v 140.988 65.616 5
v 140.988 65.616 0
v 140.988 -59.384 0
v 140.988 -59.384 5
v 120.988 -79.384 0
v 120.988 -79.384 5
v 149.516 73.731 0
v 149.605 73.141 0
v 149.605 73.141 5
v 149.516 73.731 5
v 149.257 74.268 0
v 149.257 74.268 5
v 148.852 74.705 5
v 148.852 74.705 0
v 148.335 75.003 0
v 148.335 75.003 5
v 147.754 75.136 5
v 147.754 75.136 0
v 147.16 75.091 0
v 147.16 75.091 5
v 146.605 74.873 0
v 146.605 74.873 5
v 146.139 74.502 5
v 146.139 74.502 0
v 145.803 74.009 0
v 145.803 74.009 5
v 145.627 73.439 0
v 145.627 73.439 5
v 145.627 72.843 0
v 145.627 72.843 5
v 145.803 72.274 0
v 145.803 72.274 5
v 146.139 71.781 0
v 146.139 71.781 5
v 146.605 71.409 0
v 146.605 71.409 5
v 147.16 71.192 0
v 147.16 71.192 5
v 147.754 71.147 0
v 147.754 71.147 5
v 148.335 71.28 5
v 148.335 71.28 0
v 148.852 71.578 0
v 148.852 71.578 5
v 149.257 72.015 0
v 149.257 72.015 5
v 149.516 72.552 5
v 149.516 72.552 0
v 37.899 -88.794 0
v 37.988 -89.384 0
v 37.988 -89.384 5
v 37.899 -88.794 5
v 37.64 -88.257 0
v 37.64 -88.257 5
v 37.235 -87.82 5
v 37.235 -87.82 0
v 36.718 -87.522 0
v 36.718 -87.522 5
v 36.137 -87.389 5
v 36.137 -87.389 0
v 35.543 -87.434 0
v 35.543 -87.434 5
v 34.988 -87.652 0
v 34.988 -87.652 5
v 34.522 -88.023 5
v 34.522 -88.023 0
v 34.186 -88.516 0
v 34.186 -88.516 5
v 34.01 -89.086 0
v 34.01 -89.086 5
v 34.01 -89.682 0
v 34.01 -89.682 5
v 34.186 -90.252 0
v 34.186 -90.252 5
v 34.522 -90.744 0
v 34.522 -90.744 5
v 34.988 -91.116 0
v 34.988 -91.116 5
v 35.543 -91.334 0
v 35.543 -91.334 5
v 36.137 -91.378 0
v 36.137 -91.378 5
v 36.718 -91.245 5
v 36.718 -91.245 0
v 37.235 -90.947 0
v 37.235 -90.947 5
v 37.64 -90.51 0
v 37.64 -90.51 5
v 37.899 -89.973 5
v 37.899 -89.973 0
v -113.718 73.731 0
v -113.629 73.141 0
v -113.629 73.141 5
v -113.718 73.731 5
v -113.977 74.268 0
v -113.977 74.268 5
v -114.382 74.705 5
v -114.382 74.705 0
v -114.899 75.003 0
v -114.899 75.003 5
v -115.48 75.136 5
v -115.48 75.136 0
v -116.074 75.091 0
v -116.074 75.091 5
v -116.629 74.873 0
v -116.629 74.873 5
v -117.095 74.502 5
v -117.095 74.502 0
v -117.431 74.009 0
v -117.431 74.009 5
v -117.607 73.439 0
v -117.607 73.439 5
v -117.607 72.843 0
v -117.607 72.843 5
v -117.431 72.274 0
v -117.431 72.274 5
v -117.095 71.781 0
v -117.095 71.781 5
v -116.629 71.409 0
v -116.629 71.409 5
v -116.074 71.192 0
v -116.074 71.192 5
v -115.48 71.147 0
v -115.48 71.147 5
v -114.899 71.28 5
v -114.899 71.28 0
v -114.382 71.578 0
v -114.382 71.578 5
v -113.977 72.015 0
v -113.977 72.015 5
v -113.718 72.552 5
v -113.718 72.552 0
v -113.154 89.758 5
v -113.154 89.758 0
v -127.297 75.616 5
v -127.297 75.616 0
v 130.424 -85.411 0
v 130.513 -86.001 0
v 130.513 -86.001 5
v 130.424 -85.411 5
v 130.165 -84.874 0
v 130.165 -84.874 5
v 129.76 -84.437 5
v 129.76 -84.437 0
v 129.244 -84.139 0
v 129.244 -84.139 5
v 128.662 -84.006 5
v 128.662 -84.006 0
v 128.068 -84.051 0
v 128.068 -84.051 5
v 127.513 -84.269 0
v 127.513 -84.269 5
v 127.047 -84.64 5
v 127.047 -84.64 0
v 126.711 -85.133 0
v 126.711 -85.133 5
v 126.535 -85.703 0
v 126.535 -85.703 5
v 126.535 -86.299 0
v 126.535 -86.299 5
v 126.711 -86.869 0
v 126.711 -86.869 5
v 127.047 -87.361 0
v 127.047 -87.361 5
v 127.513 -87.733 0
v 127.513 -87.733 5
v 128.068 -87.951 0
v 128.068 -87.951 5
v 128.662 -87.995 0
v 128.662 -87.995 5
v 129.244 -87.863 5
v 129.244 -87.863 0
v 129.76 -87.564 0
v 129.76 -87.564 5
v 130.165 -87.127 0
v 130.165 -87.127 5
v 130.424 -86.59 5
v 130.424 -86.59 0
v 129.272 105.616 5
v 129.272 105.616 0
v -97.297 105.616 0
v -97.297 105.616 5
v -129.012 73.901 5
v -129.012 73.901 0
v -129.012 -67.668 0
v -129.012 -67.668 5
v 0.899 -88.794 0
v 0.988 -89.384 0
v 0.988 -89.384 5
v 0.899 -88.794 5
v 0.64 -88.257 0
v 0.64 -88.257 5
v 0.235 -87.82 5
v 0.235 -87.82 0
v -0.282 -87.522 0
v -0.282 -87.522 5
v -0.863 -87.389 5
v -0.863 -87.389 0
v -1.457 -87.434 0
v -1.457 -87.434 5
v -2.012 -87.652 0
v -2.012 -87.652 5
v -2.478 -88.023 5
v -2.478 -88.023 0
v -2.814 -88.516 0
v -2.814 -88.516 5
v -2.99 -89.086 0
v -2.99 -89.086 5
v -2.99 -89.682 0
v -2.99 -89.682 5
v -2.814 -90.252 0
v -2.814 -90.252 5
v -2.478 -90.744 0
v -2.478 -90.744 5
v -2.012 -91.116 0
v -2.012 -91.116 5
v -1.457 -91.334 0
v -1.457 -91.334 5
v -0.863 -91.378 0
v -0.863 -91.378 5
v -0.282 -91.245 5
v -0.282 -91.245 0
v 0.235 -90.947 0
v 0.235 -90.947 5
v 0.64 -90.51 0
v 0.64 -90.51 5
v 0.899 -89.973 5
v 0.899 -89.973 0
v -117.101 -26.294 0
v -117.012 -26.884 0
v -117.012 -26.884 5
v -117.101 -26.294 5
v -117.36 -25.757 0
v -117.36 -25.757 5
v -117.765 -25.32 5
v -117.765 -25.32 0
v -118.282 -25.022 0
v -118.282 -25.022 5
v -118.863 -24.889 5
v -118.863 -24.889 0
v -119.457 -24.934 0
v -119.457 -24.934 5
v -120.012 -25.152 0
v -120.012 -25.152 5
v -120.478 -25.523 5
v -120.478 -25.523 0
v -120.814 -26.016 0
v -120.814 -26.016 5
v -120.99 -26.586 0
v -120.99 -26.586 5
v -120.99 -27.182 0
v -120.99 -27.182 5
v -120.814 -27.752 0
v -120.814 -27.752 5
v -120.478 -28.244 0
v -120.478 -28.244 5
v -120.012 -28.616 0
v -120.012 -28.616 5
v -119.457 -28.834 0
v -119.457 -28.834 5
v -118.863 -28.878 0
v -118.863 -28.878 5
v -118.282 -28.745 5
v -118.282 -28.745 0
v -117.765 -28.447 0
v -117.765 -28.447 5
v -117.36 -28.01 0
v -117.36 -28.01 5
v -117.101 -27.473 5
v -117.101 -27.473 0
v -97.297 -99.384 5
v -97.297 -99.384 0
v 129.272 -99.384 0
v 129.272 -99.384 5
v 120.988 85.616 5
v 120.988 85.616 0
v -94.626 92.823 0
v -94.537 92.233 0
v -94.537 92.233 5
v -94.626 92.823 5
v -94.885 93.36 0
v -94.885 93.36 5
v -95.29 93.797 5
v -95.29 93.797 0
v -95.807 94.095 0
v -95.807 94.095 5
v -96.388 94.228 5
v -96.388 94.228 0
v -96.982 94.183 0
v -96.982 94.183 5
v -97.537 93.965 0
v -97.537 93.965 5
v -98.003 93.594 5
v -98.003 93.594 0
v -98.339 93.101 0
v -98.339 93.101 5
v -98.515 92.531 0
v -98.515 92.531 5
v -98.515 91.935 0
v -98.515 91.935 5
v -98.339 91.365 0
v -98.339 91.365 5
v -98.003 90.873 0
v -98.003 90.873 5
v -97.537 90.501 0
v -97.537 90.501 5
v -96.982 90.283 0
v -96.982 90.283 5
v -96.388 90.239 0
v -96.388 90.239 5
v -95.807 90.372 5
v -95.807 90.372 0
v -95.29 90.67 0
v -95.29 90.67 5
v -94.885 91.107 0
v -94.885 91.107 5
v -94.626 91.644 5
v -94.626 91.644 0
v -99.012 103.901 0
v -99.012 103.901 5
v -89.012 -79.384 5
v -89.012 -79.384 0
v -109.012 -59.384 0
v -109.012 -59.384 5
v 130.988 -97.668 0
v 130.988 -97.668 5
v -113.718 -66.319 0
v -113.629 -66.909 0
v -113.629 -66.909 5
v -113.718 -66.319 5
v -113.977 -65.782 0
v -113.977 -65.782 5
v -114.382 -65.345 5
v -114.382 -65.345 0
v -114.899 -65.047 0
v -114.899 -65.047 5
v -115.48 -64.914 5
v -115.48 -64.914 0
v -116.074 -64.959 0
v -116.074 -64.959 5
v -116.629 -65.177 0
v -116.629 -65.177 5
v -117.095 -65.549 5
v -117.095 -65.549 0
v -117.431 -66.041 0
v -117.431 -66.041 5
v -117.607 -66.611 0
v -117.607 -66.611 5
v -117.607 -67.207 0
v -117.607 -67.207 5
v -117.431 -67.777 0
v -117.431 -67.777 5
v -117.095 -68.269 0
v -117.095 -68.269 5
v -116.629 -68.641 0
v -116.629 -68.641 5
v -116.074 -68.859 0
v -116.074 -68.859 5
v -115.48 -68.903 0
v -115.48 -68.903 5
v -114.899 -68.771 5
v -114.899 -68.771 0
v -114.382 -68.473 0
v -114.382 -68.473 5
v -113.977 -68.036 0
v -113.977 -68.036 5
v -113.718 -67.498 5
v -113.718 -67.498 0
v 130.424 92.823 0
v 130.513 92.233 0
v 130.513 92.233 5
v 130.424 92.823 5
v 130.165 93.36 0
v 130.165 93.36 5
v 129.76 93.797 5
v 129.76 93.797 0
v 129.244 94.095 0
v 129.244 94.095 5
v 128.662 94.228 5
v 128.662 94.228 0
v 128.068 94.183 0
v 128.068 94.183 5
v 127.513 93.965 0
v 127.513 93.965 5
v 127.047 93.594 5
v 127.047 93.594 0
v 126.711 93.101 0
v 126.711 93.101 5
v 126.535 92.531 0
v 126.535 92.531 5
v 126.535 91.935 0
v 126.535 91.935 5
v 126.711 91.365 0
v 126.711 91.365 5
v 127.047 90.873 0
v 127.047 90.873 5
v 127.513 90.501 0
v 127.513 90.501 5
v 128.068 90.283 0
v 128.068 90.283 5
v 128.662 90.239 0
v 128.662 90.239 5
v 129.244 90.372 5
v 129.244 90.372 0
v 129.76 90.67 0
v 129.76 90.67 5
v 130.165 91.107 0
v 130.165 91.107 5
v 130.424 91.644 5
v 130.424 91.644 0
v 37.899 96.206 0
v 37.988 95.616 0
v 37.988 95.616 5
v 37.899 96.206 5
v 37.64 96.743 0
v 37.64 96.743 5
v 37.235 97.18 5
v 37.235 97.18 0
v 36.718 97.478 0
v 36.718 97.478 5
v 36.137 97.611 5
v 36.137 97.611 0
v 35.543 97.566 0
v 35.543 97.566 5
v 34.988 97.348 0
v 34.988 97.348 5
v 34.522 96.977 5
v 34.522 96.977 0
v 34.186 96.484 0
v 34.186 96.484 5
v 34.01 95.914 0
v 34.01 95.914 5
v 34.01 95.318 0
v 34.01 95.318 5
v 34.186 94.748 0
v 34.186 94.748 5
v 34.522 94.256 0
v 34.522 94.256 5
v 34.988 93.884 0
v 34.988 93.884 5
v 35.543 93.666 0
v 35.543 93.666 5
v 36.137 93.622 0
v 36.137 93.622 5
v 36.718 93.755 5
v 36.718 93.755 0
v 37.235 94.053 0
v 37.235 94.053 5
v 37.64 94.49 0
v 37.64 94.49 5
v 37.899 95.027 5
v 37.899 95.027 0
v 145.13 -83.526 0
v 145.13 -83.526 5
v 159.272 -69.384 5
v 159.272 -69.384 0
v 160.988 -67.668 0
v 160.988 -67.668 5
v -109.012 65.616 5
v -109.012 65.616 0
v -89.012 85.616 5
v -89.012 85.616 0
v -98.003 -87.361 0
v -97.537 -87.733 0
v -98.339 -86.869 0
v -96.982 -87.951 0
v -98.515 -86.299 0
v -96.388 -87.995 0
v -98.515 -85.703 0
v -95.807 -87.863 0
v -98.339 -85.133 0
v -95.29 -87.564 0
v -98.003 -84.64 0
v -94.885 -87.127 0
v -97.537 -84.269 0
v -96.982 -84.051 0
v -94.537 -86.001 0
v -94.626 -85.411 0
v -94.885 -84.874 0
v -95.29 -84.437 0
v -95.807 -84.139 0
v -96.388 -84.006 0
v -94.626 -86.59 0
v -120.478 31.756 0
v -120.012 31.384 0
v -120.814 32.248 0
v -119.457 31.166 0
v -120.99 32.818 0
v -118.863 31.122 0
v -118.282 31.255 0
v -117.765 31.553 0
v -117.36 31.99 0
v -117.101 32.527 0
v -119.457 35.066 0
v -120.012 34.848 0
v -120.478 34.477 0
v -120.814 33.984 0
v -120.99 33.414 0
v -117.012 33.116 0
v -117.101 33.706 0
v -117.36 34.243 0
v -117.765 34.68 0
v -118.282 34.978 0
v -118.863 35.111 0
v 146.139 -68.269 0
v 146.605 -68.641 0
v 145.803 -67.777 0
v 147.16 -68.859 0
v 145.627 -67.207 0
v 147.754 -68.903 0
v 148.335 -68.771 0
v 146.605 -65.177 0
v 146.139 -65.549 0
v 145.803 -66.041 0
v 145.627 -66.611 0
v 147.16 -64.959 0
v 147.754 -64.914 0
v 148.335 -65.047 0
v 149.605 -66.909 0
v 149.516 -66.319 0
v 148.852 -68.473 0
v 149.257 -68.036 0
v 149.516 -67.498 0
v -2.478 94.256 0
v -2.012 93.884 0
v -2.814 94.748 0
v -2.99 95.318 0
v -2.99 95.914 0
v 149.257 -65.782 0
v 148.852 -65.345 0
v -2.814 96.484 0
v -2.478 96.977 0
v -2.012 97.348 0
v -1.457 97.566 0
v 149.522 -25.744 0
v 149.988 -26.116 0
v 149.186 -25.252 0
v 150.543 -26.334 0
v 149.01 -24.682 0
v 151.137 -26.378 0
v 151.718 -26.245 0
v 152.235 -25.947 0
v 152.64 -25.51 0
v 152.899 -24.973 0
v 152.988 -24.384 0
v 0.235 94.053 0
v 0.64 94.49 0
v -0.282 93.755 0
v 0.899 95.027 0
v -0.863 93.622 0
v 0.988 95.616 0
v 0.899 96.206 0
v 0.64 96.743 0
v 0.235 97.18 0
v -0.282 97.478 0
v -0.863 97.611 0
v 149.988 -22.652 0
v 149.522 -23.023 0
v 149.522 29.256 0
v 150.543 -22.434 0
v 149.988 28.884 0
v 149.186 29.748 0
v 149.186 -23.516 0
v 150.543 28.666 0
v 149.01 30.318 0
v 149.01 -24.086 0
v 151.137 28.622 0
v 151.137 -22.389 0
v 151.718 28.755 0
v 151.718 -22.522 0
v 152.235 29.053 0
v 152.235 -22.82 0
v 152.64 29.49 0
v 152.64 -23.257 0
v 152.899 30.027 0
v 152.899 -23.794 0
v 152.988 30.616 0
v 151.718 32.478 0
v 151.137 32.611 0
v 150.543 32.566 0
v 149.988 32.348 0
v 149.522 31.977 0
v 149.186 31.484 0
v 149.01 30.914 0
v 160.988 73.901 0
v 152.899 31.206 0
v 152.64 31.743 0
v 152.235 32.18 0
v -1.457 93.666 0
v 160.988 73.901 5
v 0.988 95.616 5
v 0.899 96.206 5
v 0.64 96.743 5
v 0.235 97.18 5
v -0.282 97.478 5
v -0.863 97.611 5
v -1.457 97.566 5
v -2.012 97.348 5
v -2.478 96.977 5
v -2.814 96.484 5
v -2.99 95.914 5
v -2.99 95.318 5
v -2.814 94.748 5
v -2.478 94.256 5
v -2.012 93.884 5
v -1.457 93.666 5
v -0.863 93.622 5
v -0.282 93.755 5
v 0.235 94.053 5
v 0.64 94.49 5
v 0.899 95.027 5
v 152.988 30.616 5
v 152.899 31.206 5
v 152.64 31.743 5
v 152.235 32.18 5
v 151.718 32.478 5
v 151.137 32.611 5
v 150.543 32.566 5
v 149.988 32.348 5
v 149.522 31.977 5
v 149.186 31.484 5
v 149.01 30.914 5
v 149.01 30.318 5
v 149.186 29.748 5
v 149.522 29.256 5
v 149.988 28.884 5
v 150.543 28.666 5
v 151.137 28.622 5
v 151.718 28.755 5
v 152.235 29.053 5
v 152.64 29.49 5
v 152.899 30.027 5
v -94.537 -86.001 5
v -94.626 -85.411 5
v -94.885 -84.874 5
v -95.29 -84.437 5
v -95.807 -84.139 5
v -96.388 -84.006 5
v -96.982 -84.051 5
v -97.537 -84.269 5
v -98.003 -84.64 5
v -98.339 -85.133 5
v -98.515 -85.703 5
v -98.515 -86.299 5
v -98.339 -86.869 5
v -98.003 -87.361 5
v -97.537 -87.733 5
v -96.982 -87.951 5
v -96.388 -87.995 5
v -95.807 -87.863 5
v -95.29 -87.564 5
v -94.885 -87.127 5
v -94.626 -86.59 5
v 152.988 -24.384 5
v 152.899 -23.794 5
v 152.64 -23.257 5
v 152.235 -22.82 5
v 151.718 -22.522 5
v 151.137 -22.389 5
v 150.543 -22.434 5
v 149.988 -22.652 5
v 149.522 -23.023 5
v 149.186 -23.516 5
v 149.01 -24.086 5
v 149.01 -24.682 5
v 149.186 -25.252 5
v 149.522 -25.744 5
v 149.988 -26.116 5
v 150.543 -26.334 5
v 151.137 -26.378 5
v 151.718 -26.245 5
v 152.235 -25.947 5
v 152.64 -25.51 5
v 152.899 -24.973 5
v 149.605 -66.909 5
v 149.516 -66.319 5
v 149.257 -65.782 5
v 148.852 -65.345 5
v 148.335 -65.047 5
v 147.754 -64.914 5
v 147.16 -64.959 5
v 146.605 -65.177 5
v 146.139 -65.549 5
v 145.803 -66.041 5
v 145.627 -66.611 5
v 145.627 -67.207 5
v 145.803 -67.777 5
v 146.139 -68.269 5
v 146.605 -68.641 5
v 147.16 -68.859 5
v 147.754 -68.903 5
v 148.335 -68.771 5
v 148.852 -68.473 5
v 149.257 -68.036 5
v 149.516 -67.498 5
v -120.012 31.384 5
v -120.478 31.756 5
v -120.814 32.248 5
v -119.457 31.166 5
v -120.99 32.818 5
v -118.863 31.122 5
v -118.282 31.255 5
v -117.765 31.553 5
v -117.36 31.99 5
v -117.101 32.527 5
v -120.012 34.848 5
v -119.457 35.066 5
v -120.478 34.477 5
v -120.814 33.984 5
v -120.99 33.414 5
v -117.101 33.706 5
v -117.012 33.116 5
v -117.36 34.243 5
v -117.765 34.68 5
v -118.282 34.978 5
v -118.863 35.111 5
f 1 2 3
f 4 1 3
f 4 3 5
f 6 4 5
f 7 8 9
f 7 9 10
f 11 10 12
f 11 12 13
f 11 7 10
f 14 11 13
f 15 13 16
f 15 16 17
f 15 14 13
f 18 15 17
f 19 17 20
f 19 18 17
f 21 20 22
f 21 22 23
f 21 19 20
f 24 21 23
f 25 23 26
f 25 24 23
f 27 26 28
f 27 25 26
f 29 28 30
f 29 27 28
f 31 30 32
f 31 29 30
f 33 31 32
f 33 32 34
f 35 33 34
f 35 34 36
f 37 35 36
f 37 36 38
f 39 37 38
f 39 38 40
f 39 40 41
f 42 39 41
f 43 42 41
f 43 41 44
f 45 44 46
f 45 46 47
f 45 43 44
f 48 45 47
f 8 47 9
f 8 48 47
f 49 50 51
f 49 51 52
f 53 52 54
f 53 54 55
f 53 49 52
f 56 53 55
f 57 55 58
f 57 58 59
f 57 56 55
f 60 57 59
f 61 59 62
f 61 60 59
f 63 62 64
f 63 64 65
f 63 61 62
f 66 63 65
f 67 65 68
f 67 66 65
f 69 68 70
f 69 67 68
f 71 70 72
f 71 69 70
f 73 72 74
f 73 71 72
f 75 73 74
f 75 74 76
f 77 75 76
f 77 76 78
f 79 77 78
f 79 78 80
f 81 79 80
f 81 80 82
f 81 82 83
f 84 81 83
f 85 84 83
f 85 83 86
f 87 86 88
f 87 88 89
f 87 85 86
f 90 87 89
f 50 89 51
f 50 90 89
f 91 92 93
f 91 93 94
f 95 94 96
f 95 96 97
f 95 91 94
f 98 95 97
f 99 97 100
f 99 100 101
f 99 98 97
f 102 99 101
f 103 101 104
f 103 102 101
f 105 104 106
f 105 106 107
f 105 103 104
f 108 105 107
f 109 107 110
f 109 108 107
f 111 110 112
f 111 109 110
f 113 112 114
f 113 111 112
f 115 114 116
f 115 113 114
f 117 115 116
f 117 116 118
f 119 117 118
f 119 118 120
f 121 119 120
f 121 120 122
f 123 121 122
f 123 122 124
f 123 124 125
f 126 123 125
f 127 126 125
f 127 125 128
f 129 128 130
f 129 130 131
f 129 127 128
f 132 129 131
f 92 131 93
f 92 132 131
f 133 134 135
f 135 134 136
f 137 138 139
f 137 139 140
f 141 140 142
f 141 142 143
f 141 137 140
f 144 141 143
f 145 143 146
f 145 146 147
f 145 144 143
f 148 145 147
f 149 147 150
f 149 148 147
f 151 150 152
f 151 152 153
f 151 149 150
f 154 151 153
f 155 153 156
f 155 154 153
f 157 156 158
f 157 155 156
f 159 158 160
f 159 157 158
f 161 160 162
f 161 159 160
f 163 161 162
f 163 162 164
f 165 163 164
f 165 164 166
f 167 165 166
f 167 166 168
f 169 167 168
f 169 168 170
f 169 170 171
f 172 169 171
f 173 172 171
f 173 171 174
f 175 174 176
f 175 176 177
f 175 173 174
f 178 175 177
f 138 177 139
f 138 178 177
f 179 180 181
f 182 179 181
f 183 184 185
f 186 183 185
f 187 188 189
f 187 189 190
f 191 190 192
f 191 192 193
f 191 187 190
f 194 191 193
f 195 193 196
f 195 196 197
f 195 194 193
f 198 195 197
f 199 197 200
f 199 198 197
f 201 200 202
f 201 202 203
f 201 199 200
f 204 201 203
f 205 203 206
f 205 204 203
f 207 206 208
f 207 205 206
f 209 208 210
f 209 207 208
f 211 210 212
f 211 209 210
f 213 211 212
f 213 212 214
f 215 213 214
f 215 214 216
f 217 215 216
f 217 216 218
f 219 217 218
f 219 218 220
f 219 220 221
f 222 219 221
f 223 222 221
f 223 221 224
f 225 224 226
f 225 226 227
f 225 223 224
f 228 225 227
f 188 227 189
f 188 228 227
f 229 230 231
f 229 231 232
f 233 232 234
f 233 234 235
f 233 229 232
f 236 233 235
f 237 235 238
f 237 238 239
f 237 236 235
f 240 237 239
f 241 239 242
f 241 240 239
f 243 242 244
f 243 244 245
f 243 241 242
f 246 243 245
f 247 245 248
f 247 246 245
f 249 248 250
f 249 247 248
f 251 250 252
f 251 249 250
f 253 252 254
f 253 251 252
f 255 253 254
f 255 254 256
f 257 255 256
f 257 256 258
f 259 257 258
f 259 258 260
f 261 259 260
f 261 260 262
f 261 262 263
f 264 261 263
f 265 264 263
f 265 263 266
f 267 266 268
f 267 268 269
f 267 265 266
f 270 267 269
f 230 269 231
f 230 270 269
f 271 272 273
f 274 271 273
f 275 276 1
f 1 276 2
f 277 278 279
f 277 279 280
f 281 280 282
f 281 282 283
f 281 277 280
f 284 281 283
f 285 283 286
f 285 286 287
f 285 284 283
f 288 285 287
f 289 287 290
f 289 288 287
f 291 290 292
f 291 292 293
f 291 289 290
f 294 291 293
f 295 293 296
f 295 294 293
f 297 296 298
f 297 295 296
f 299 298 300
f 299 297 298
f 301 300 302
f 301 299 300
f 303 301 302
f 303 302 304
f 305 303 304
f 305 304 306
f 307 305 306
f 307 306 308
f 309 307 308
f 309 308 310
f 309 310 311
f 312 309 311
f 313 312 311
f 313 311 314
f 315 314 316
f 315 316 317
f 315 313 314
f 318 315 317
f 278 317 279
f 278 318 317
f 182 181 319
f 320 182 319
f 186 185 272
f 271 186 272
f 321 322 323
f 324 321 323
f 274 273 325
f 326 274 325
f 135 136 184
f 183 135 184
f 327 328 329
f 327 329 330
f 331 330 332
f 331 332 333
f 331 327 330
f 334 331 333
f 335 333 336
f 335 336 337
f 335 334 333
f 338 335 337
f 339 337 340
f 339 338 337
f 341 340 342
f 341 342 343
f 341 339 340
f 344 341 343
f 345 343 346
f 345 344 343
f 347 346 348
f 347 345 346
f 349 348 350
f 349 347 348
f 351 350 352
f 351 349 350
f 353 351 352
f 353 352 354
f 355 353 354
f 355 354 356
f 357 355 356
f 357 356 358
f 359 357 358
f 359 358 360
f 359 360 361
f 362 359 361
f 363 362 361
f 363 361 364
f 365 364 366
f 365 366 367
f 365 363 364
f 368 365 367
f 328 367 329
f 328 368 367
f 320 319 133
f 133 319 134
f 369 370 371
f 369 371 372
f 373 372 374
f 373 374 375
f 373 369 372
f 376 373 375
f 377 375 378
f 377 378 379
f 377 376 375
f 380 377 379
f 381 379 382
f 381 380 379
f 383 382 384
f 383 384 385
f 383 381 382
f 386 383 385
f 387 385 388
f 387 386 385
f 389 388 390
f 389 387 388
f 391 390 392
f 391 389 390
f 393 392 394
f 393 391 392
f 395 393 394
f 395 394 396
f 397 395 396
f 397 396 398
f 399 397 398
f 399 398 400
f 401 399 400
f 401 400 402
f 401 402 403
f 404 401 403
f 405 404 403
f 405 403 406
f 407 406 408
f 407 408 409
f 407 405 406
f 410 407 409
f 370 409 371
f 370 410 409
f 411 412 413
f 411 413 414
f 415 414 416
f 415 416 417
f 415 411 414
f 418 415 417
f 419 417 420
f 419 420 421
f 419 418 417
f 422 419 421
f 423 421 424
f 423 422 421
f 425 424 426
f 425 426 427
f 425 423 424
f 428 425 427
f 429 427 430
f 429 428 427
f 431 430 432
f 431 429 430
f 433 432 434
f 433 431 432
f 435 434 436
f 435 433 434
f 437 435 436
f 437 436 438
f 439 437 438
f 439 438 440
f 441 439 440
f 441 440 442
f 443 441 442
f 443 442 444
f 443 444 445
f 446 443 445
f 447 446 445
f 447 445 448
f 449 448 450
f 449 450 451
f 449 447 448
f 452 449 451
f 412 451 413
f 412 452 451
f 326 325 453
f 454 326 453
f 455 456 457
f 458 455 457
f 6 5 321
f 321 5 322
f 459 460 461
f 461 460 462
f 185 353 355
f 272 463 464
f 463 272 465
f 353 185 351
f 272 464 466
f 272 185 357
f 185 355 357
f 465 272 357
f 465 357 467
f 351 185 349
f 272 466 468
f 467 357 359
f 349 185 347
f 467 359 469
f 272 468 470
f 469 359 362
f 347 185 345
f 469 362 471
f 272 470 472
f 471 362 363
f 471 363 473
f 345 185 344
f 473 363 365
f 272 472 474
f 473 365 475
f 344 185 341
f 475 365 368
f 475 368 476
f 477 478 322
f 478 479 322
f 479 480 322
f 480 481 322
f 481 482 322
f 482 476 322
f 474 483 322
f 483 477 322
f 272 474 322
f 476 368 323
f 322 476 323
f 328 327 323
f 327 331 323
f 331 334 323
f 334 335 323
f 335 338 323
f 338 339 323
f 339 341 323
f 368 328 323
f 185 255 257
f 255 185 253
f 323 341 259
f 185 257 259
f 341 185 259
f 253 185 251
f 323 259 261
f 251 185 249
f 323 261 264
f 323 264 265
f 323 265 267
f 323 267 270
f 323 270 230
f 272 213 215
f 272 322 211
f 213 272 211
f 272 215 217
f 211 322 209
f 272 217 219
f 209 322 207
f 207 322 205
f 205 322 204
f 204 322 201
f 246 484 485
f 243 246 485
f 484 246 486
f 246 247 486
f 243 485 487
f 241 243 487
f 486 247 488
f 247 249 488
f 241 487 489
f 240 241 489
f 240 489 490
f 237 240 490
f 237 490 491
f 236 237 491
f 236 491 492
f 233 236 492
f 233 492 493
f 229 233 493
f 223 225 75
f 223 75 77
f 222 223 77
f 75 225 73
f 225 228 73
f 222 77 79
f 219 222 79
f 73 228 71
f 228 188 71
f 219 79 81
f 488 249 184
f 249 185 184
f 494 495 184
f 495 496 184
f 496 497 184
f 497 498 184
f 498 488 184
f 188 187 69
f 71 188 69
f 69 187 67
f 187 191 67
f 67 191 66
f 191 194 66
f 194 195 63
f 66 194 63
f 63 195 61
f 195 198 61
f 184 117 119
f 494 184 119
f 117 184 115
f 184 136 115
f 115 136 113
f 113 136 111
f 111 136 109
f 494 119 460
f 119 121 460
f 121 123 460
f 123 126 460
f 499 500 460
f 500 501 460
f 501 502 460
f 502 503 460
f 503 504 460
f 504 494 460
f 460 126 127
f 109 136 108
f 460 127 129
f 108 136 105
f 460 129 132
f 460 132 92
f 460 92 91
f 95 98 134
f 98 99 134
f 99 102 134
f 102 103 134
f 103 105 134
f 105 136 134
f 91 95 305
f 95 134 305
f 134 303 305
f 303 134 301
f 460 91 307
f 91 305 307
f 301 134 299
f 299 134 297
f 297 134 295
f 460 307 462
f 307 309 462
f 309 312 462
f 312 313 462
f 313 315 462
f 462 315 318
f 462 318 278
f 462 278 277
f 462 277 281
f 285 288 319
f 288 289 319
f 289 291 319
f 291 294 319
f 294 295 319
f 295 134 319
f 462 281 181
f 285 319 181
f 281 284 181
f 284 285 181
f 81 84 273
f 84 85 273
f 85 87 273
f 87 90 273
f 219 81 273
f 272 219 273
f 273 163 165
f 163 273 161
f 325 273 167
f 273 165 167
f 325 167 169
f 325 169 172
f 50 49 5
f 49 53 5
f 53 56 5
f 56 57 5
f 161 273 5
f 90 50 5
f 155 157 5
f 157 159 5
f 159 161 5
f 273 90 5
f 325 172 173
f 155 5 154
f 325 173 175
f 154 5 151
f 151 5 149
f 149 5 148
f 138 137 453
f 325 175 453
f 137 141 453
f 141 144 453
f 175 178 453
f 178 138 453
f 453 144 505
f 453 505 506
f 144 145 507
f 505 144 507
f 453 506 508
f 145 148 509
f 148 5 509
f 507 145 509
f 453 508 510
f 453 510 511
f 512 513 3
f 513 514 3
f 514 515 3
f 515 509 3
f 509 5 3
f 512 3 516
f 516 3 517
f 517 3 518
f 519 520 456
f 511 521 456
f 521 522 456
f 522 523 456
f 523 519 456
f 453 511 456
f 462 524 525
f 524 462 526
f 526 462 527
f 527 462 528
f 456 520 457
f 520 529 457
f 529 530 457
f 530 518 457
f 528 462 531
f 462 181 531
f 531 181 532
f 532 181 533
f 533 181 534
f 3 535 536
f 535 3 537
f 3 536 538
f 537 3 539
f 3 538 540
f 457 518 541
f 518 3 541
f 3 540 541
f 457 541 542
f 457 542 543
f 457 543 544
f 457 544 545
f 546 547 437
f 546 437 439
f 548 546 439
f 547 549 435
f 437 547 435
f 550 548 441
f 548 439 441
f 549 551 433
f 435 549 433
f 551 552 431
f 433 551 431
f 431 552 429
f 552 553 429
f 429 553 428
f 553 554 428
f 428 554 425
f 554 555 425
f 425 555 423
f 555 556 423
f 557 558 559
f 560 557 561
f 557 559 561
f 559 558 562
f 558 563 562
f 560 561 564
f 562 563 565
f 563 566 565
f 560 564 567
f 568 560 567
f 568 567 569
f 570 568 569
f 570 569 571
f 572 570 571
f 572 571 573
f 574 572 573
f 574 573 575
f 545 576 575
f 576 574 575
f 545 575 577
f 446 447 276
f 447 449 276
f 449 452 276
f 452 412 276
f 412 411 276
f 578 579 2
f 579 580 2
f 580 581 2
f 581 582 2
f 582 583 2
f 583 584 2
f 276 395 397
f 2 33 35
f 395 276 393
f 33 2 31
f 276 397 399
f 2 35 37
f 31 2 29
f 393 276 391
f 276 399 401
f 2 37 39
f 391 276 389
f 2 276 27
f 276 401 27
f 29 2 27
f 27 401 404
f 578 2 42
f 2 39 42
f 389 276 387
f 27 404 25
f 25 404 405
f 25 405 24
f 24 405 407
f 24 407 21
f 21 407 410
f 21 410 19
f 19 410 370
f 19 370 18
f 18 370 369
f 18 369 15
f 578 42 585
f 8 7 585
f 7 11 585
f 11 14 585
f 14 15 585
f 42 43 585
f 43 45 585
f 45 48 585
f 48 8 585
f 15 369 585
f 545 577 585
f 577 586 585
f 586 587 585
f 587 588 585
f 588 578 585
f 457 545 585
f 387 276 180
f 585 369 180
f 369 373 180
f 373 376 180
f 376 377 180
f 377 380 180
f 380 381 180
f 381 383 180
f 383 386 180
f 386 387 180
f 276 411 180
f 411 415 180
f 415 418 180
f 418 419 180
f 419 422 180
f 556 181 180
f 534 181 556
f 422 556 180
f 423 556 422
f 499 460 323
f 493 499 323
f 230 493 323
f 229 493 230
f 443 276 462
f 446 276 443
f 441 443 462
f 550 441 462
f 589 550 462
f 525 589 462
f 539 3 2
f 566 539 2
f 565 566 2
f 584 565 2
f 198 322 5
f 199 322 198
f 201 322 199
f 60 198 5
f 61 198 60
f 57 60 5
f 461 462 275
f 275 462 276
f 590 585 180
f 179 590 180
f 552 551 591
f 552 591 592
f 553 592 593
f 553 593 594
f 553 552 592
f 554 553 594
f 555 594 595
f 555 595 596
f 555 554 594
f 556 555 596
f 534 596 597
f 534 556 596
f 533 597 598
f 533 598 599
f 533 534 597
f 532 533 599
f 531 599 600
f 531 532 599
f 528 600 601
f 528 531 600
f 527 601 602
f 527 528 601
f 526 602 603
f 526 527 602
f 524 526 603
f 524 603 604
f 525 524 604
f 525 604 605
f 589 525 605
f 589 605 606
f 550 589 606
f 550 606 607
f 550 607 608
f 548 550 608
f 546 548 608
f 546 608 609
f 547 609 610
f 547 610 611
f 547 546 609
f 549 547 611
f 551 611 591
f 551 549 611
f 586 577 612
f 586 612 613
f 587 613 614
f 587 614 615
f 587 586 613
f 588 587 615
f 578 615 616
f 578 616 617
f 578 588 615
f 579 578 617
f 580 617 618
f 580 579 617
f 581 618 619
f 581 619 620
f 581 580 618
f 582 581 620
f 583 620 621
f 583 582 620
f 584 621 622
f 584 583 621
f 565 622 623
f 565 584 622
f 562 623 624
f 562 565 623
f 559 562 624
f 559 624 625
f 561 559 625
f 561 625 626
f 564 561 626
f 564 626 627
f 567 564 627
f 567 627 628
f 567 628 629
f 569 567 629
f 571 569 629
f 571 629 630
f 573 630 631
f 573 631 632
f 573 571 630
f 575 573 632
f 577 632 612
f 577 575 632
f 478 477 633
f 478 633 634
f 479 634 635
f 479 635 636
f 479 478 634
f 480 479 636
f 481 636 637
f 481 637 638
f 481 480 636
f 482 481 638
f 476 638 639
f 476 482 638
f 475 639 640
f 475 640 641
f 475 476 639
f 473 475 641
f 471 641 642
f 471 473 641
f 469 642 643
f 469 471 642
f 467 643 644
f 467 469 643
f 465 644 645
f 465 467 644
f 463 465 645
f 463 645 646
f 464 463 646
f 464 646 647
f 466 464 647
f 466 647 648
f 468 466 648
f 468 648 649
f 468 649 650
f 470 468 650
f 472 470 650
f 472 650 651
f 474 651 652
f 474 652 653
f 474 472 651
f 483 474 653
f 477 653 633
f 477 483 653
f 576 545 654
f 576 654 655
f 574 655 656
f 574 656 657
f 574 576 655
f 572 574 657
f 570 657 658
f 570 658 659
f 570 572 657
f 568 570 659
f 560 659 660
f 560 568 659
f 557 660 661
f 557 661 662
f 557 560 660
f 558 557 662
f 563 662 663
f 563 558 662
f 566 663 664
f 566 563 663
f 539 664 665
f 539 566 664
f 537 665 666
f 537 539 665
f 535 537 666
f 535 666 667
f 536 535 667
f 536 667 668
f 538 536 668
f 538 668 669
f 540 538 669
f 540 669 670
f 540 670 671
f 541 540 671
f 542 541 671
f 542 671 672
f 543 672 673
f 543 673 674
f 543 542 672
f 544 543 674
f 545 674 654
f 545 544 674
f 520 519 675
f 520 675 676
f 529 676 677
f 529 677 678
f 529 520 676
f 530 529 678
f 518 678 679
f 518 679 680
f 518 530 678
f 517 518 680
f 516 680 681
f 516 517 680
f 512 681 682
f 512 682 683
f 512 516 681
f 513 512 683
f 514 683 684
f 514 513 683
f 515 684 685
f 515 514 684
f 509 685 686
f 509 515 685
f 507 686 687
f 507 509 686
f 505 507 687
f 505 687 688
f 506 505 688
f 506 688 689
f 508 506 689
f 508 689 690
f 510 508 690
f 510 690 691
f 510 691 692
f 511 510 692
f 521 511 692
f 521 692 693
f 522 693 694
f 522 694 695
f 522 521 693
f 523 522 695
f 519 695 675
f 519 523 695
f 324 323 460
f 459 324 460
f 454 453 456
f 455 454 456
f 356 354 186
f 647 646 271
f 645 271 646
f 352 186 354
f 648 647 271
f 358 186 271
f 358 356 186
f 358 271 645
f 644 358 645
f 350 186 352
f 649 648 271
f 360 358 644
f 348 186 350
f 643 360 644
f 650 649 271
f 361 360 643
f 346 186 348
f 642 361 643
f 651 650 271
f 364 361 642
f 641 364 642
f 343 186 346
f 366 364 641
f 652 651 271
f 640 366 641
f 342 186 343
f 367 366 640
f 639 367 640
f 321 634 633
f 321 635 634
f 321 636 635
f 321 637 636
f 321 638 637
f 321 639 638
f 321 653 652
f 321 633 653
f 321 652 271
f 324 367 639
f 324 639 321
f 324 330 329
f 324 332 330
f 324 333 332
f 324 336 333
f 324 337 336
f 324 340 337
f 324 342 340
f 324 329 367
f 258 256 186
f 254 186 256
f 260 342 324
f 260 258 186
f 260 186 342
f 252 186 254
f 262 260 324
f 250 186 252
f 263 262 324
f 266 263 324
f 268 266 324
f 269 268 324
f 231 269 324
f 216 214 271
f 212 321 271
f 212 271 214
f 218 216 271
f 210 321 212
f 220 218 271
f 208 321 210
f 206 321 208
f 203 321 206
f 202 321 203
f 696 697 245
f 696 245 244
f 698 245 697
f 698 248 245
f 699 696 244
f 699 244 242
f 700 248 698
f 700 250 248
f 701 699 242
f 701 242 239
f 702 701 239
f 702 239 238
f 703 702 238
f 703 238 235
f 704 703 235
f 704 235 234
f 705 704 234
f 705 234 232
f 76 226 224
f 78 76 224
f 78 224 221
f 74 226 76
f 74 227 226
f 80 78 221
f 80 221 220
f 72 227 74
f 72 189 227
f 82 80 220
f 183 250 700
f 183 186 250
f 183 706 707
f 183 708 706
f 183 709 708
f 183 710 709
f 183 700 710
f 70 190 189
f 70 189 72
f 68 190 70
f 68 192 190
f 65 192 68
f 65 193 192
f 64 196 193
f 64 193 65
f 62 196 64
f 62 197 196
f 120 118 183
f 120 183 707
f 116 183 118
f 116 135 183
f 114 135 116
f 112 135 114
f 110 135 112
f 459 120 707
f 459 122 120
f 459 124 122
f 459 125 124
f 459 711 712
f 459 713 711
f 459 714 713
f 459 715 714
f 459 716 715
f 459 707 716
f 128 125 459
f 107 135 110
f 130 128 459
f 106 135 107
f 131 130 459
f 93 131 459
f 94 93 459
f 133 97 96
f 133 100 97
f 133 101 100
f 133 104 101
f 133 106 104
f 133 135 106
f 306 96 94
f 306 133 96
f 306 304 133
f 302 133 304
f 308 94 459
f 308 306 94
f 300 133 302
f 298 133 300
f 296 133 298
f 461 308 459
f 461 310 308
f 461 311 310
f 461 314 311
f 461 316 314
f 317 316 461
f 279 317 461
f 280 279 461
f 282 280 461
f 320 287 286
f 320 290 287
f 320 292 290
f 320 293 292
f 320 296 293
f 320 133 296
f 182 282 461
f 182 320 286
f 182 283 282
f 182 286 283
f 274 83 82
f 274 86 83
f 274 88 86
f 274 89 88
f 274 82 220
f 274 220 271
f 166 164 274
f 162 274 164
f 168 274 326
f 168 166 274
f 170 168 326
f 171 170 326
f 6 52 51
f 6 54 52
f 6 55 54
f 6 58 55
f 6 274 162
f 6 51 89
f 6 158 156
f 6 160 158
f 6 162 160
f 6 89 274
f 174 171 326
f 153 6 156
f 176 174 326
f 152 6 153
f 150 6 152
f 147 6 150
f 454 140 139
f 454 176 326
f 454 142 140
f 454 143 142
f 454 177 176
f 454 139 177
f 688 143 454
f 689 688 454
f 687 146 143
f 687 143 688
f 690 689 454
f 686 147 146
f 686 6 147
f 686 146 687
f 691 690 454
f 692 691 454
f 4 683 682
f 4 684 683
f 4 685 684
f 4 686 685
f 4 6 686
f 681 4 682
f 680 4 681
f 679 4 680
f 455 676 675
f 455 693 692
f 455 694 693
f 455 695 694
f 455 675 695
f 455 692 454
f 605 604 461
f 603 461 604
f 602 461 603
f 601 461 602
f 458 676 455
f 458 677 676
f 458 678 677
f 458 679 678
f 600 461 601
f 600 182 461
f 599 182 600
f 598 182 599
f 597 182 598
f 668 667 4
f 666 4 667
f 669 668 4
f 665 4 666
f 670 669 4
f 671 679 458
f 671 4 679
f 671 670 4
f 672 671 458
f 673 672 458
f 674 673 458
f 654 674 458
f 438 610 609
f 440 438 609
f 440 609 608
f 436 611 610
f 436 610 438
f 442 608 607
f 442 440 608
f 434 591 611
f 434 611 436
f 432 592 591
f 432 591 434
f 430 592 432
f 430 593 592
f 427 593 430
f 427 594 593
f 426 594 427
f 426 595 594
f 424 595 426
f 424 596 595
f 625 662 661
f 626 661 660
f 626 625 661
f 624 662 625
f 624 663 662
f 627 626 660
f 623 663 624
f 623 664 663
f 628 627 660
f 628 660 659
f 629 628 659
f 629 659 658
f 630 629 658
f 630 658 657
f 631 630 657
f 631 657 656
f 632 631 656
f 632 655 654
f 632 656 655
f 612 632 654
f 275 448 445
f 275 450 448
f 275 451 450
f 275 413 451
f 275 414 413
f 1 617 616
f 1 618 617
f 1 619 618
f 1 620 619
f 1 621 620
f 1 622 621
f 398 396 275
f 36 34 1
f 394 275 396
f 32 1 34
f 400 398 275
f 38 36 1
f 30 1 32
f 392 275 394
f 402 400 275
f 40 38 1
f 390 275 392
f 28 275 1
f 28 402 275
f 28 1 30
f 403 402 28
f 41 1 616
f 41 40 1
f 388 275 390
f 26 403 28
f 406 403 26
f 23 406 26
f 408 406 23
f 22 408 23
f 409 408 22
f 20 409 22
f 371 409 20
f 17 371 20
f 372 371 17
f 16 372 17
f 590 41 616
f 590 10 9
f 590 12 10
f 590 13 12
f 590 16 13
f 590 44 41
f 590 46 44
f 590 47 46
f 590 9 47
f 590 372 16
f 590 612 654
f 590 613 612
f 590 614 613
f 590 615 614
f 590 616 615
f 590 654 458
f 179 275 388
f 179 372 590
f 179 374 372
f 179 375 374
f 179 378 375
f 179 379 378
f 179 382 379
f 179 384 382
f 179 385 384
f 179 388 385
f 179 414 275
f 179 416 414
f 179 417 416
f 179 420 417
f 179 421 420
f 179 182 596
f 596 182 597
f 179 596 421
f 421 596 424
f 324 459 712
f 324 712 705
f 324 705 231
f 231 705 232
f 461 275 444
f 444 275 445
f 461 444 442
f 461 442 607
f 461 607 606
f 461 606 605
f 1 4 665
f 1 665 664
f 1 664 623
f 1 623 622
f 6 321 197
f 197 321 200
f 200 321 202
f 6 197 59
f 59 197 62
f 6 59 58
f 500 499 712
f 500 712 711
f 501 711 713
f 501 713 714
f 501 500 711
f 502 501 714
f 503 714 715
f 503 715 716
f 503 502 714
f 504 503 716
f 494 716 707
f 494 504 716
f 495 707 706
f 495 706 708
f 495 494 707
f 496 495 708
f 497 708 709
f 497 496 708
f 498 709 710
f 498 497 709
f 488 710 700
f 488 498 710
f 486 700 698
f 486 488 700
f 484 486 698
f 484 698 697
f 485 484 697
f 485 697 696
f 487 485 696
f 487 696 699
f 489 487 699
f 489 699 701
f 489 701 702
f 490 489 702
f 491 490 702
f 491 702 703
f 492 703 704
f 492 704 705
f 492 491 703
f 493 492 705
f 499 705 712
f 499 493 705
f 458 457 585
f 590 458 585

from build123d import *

# Parameters (mm, degrees)
SKETCH1_W           = 20
SKETCH1_H           = 80
SKETCH1_R           = 2
SKETCH1_W_2         = 27
SKETCH1_H_2         = 20
SKETCH1_W_3         = 30
SKETCH1_H_3         = 70
SKETCH1_W_4         = 57
BOSS_EXTRUDE1_DEPTH = 5


with BuildPart() as part:
    # Sketch1 → Boss-Extrude1 (new body)
    with BuildSketch(Plane.XY):
        Polygon((-113.154404335, -55.241611667), (-109.012268711, -59.383747291), (-109.012268711, -36.883747291), (-129.012268711, -36.883747291), (-129.012268711, -67.668018539), (-127.296539959, -69.383747291), align=None)
        with Locations((-119.012268711, 3.116252709)):
            Rectangle(SKETCH1_W, SKETCH1_H)
        with Locations((-119.012268711, -26.883747291)):
            Circle(SKETCH1_R, mode=Mode.SUBTRACT)
        with Locations((-119.012268711, 33.116252709)):
            Circle(SKETCH1_R, mode=Mode.SUBTRACT)
        Polygon((-113.154404335, -83.525882915), (-99.012268711, -69.383747291), (-109.012268711, -59.383747291), (-113.154404335, -55.241611667), (-127.296539959, -69.383747291), align=None)
        with Locations((-115.629278069, -66.908873557)):
            Circle(SKETCH1_R, mode=Mode.SUBTRACT)
        Polygon((-84.870133088, -83.525882915), (-89.012268711, -79.383747291), (-99.012268711, -69.383747291), (-113.154404335, -83.525882915), (-99.012268711, -97.668018539), align=None)
        with Locations((-96.537394977, -86.000756649)):
            Circle(SKETCH1_R, mode=Mode.SUBTRACT)
        Polygon((-11.012268711, -79.383747291), (-89.012268711, -79.383747291), (-84.870133088, -83.525882915), (-99.012268711, -97.668018539), (-97.296539959, -99.383747291), (-11.012268711, -99.383747291), align=None)
        with Locations((2.487731289, -89.383747291)):
            Rectangle(SKETCH1_W_2, SKETCH1_H_2)
        with Locations((-1.012268711, -89.383747291)):
            Circle(SKETCH1_R, mode=Mode.SUBTRACT)
        with Locations((30.987731289, -89.383747291)):
            Rectangle(SKETCH1_W_3, SKETCH1_H_2)
        with Locations((35.987731289, -89.383747291)):
            Circle(SKETCH1_R, mode=Mode.SUBTRACT)
        Polygon((116.845595665, -83.525882915), (120.987731289, -79.383747291), (45.987731289, -79.383747291), (45.987731289, -99.383747291), (129.272002536, -99.383747291), (130.987731289, -97.668018539), align=None)
        Polygon((130.987731289, -69.383747291), (120.987731289, -79.383747291), (116.845595665, -83.525882915), (130.987731289, -97.668018539), (145.129866912, -83.525882915), align=None)
        with Locations((128.512857554, -86.000756649)):
            Circle(SKETCH1_R, mode=Mode.SUBTRACT)
        Polygon((140.987731289, -59.383747291), (130.987731289, -69.383747291), (145.129866912, -83.525882915), (159.272002536, -69.383747291), (145.129866912, -55.241611667), align=None)
        with Locations((147.604740646, -66.908873557)):
            Circle(SKETCH1_R, mode=Mode.SUBTRACT)
        Polygon((140.987731289, -31.883747291), (140.987731289, -59.383747291), (145.129866912, -55.241611667), (159.272002536, -69.383747291), (160.987731289, -67.668018539), (160.987731289, -31.883747291), align=None)
        with Locations((150.987731289, 3.116252709)):
            Rectangle(SKETCH1_W, SKETCH1_H_3)
        with Locations((150.987731289, -24.383747291)):
            Circle(SKETCH1_R, mode=Mode.SUBTRACT)
        with Locations((150.987731289, 30.616252709)):
            Circle(SKETCH1_R, mode=Mode.SUBTRACT)
        Polygon((145.129866912, 61.474117085), (140.987731289, 65.616252709), (140.987731289, 38.116252709), (160.987731289, 38.116252709), (160.987731289, 73.900523956), (159.272002536, 75.616252709), align=None)
        Polygon((145.129866912, 89.758388333), (130.987731289, 75.616252709), (140.987731289, 65.616252709), (145.129866912, 61.474117085), (159.272002536, 75.616252709), align=None)
        with Locations((147.604740646, 73.141378975)):
            Circle(SKETCH1_R, mode=Mode.SUBTRACT)
        Polygon((116.845595665, 89.758388333), (120.987731289, 85.616252709), (130.987731289, 75.616252709), (145.129866912, 89.758388333), (130.987731289, 103.900523956), align=None)
        with Locations((128.512857554, 92.233262067)):
            Circle(SKETCH1_R, mode=Mode.SUBTRACT)
        Polygon((45.987731289, 105.616252709), (45.987731289, 85.616252709), (120.987731289, 85.616252709), (116.845595665, 89.758388333), (130.987731289, 103.900523956), (129.272002536, 105.616252709), align=None)
        with Locations((17.487731289, 95.616252709)):
            Rectangle(SKETCH1_W_4, SKETCH1_H_2)
        with Locations((-1.012268711, 95.616252709)):
            Circle(SKETCH1_R, mode=Mode.SUBTRACT)
        with Locations((35.987731289, 95.616252709)):
            Circle(SKETCH1_R, mode=Mode.SUBTRACT)
        Polygon((-84.870133088, 89.758388333), (-89.012268711, 85.616252709), (-11.012268711, 85.616252709), (-11.012268711, 105.616252709), (-97.296539959, 105.616252709), (-99.012268711, 103.900523956), align=None)
        Polygon((-99.012268711, 75.616252709), (-89.012268711, 85.616252709), (-84.870133088, 89.758388333), (-99.012268711, 103.900523956), (-113.154404335, 89.758388333), align=None)
        with Locations((-96.537394977, 92.233262067)):
            Circle(SKETCH1_R, mode=Mode.SUBTRACT)
        Polygon((-109.012268711, 65.616252709), (-99.012268711, 75.616252709), (-113.154404335, 89.758388333), (-127.296539959, 75.616252709), (-113.154404335, 61.474117085), align=None)
        with Locations((-115.629278069, 73.141378975)):
            Circle(SKETCH1_R, mode=Mode.SUBTRACT)
        Polygon((-109.012268711, 43.116252709), (-109.012268711, 65.616252709), (-113.154404335, 61.474117085), (-127.296539959, 75.616252709), (-129.012268711, 73.900523956), (-129.012268711, 43.116252709), align=None)
    extrude(amount=BOSS_EXTRUDE1_DEPTH)


solid = part.part
